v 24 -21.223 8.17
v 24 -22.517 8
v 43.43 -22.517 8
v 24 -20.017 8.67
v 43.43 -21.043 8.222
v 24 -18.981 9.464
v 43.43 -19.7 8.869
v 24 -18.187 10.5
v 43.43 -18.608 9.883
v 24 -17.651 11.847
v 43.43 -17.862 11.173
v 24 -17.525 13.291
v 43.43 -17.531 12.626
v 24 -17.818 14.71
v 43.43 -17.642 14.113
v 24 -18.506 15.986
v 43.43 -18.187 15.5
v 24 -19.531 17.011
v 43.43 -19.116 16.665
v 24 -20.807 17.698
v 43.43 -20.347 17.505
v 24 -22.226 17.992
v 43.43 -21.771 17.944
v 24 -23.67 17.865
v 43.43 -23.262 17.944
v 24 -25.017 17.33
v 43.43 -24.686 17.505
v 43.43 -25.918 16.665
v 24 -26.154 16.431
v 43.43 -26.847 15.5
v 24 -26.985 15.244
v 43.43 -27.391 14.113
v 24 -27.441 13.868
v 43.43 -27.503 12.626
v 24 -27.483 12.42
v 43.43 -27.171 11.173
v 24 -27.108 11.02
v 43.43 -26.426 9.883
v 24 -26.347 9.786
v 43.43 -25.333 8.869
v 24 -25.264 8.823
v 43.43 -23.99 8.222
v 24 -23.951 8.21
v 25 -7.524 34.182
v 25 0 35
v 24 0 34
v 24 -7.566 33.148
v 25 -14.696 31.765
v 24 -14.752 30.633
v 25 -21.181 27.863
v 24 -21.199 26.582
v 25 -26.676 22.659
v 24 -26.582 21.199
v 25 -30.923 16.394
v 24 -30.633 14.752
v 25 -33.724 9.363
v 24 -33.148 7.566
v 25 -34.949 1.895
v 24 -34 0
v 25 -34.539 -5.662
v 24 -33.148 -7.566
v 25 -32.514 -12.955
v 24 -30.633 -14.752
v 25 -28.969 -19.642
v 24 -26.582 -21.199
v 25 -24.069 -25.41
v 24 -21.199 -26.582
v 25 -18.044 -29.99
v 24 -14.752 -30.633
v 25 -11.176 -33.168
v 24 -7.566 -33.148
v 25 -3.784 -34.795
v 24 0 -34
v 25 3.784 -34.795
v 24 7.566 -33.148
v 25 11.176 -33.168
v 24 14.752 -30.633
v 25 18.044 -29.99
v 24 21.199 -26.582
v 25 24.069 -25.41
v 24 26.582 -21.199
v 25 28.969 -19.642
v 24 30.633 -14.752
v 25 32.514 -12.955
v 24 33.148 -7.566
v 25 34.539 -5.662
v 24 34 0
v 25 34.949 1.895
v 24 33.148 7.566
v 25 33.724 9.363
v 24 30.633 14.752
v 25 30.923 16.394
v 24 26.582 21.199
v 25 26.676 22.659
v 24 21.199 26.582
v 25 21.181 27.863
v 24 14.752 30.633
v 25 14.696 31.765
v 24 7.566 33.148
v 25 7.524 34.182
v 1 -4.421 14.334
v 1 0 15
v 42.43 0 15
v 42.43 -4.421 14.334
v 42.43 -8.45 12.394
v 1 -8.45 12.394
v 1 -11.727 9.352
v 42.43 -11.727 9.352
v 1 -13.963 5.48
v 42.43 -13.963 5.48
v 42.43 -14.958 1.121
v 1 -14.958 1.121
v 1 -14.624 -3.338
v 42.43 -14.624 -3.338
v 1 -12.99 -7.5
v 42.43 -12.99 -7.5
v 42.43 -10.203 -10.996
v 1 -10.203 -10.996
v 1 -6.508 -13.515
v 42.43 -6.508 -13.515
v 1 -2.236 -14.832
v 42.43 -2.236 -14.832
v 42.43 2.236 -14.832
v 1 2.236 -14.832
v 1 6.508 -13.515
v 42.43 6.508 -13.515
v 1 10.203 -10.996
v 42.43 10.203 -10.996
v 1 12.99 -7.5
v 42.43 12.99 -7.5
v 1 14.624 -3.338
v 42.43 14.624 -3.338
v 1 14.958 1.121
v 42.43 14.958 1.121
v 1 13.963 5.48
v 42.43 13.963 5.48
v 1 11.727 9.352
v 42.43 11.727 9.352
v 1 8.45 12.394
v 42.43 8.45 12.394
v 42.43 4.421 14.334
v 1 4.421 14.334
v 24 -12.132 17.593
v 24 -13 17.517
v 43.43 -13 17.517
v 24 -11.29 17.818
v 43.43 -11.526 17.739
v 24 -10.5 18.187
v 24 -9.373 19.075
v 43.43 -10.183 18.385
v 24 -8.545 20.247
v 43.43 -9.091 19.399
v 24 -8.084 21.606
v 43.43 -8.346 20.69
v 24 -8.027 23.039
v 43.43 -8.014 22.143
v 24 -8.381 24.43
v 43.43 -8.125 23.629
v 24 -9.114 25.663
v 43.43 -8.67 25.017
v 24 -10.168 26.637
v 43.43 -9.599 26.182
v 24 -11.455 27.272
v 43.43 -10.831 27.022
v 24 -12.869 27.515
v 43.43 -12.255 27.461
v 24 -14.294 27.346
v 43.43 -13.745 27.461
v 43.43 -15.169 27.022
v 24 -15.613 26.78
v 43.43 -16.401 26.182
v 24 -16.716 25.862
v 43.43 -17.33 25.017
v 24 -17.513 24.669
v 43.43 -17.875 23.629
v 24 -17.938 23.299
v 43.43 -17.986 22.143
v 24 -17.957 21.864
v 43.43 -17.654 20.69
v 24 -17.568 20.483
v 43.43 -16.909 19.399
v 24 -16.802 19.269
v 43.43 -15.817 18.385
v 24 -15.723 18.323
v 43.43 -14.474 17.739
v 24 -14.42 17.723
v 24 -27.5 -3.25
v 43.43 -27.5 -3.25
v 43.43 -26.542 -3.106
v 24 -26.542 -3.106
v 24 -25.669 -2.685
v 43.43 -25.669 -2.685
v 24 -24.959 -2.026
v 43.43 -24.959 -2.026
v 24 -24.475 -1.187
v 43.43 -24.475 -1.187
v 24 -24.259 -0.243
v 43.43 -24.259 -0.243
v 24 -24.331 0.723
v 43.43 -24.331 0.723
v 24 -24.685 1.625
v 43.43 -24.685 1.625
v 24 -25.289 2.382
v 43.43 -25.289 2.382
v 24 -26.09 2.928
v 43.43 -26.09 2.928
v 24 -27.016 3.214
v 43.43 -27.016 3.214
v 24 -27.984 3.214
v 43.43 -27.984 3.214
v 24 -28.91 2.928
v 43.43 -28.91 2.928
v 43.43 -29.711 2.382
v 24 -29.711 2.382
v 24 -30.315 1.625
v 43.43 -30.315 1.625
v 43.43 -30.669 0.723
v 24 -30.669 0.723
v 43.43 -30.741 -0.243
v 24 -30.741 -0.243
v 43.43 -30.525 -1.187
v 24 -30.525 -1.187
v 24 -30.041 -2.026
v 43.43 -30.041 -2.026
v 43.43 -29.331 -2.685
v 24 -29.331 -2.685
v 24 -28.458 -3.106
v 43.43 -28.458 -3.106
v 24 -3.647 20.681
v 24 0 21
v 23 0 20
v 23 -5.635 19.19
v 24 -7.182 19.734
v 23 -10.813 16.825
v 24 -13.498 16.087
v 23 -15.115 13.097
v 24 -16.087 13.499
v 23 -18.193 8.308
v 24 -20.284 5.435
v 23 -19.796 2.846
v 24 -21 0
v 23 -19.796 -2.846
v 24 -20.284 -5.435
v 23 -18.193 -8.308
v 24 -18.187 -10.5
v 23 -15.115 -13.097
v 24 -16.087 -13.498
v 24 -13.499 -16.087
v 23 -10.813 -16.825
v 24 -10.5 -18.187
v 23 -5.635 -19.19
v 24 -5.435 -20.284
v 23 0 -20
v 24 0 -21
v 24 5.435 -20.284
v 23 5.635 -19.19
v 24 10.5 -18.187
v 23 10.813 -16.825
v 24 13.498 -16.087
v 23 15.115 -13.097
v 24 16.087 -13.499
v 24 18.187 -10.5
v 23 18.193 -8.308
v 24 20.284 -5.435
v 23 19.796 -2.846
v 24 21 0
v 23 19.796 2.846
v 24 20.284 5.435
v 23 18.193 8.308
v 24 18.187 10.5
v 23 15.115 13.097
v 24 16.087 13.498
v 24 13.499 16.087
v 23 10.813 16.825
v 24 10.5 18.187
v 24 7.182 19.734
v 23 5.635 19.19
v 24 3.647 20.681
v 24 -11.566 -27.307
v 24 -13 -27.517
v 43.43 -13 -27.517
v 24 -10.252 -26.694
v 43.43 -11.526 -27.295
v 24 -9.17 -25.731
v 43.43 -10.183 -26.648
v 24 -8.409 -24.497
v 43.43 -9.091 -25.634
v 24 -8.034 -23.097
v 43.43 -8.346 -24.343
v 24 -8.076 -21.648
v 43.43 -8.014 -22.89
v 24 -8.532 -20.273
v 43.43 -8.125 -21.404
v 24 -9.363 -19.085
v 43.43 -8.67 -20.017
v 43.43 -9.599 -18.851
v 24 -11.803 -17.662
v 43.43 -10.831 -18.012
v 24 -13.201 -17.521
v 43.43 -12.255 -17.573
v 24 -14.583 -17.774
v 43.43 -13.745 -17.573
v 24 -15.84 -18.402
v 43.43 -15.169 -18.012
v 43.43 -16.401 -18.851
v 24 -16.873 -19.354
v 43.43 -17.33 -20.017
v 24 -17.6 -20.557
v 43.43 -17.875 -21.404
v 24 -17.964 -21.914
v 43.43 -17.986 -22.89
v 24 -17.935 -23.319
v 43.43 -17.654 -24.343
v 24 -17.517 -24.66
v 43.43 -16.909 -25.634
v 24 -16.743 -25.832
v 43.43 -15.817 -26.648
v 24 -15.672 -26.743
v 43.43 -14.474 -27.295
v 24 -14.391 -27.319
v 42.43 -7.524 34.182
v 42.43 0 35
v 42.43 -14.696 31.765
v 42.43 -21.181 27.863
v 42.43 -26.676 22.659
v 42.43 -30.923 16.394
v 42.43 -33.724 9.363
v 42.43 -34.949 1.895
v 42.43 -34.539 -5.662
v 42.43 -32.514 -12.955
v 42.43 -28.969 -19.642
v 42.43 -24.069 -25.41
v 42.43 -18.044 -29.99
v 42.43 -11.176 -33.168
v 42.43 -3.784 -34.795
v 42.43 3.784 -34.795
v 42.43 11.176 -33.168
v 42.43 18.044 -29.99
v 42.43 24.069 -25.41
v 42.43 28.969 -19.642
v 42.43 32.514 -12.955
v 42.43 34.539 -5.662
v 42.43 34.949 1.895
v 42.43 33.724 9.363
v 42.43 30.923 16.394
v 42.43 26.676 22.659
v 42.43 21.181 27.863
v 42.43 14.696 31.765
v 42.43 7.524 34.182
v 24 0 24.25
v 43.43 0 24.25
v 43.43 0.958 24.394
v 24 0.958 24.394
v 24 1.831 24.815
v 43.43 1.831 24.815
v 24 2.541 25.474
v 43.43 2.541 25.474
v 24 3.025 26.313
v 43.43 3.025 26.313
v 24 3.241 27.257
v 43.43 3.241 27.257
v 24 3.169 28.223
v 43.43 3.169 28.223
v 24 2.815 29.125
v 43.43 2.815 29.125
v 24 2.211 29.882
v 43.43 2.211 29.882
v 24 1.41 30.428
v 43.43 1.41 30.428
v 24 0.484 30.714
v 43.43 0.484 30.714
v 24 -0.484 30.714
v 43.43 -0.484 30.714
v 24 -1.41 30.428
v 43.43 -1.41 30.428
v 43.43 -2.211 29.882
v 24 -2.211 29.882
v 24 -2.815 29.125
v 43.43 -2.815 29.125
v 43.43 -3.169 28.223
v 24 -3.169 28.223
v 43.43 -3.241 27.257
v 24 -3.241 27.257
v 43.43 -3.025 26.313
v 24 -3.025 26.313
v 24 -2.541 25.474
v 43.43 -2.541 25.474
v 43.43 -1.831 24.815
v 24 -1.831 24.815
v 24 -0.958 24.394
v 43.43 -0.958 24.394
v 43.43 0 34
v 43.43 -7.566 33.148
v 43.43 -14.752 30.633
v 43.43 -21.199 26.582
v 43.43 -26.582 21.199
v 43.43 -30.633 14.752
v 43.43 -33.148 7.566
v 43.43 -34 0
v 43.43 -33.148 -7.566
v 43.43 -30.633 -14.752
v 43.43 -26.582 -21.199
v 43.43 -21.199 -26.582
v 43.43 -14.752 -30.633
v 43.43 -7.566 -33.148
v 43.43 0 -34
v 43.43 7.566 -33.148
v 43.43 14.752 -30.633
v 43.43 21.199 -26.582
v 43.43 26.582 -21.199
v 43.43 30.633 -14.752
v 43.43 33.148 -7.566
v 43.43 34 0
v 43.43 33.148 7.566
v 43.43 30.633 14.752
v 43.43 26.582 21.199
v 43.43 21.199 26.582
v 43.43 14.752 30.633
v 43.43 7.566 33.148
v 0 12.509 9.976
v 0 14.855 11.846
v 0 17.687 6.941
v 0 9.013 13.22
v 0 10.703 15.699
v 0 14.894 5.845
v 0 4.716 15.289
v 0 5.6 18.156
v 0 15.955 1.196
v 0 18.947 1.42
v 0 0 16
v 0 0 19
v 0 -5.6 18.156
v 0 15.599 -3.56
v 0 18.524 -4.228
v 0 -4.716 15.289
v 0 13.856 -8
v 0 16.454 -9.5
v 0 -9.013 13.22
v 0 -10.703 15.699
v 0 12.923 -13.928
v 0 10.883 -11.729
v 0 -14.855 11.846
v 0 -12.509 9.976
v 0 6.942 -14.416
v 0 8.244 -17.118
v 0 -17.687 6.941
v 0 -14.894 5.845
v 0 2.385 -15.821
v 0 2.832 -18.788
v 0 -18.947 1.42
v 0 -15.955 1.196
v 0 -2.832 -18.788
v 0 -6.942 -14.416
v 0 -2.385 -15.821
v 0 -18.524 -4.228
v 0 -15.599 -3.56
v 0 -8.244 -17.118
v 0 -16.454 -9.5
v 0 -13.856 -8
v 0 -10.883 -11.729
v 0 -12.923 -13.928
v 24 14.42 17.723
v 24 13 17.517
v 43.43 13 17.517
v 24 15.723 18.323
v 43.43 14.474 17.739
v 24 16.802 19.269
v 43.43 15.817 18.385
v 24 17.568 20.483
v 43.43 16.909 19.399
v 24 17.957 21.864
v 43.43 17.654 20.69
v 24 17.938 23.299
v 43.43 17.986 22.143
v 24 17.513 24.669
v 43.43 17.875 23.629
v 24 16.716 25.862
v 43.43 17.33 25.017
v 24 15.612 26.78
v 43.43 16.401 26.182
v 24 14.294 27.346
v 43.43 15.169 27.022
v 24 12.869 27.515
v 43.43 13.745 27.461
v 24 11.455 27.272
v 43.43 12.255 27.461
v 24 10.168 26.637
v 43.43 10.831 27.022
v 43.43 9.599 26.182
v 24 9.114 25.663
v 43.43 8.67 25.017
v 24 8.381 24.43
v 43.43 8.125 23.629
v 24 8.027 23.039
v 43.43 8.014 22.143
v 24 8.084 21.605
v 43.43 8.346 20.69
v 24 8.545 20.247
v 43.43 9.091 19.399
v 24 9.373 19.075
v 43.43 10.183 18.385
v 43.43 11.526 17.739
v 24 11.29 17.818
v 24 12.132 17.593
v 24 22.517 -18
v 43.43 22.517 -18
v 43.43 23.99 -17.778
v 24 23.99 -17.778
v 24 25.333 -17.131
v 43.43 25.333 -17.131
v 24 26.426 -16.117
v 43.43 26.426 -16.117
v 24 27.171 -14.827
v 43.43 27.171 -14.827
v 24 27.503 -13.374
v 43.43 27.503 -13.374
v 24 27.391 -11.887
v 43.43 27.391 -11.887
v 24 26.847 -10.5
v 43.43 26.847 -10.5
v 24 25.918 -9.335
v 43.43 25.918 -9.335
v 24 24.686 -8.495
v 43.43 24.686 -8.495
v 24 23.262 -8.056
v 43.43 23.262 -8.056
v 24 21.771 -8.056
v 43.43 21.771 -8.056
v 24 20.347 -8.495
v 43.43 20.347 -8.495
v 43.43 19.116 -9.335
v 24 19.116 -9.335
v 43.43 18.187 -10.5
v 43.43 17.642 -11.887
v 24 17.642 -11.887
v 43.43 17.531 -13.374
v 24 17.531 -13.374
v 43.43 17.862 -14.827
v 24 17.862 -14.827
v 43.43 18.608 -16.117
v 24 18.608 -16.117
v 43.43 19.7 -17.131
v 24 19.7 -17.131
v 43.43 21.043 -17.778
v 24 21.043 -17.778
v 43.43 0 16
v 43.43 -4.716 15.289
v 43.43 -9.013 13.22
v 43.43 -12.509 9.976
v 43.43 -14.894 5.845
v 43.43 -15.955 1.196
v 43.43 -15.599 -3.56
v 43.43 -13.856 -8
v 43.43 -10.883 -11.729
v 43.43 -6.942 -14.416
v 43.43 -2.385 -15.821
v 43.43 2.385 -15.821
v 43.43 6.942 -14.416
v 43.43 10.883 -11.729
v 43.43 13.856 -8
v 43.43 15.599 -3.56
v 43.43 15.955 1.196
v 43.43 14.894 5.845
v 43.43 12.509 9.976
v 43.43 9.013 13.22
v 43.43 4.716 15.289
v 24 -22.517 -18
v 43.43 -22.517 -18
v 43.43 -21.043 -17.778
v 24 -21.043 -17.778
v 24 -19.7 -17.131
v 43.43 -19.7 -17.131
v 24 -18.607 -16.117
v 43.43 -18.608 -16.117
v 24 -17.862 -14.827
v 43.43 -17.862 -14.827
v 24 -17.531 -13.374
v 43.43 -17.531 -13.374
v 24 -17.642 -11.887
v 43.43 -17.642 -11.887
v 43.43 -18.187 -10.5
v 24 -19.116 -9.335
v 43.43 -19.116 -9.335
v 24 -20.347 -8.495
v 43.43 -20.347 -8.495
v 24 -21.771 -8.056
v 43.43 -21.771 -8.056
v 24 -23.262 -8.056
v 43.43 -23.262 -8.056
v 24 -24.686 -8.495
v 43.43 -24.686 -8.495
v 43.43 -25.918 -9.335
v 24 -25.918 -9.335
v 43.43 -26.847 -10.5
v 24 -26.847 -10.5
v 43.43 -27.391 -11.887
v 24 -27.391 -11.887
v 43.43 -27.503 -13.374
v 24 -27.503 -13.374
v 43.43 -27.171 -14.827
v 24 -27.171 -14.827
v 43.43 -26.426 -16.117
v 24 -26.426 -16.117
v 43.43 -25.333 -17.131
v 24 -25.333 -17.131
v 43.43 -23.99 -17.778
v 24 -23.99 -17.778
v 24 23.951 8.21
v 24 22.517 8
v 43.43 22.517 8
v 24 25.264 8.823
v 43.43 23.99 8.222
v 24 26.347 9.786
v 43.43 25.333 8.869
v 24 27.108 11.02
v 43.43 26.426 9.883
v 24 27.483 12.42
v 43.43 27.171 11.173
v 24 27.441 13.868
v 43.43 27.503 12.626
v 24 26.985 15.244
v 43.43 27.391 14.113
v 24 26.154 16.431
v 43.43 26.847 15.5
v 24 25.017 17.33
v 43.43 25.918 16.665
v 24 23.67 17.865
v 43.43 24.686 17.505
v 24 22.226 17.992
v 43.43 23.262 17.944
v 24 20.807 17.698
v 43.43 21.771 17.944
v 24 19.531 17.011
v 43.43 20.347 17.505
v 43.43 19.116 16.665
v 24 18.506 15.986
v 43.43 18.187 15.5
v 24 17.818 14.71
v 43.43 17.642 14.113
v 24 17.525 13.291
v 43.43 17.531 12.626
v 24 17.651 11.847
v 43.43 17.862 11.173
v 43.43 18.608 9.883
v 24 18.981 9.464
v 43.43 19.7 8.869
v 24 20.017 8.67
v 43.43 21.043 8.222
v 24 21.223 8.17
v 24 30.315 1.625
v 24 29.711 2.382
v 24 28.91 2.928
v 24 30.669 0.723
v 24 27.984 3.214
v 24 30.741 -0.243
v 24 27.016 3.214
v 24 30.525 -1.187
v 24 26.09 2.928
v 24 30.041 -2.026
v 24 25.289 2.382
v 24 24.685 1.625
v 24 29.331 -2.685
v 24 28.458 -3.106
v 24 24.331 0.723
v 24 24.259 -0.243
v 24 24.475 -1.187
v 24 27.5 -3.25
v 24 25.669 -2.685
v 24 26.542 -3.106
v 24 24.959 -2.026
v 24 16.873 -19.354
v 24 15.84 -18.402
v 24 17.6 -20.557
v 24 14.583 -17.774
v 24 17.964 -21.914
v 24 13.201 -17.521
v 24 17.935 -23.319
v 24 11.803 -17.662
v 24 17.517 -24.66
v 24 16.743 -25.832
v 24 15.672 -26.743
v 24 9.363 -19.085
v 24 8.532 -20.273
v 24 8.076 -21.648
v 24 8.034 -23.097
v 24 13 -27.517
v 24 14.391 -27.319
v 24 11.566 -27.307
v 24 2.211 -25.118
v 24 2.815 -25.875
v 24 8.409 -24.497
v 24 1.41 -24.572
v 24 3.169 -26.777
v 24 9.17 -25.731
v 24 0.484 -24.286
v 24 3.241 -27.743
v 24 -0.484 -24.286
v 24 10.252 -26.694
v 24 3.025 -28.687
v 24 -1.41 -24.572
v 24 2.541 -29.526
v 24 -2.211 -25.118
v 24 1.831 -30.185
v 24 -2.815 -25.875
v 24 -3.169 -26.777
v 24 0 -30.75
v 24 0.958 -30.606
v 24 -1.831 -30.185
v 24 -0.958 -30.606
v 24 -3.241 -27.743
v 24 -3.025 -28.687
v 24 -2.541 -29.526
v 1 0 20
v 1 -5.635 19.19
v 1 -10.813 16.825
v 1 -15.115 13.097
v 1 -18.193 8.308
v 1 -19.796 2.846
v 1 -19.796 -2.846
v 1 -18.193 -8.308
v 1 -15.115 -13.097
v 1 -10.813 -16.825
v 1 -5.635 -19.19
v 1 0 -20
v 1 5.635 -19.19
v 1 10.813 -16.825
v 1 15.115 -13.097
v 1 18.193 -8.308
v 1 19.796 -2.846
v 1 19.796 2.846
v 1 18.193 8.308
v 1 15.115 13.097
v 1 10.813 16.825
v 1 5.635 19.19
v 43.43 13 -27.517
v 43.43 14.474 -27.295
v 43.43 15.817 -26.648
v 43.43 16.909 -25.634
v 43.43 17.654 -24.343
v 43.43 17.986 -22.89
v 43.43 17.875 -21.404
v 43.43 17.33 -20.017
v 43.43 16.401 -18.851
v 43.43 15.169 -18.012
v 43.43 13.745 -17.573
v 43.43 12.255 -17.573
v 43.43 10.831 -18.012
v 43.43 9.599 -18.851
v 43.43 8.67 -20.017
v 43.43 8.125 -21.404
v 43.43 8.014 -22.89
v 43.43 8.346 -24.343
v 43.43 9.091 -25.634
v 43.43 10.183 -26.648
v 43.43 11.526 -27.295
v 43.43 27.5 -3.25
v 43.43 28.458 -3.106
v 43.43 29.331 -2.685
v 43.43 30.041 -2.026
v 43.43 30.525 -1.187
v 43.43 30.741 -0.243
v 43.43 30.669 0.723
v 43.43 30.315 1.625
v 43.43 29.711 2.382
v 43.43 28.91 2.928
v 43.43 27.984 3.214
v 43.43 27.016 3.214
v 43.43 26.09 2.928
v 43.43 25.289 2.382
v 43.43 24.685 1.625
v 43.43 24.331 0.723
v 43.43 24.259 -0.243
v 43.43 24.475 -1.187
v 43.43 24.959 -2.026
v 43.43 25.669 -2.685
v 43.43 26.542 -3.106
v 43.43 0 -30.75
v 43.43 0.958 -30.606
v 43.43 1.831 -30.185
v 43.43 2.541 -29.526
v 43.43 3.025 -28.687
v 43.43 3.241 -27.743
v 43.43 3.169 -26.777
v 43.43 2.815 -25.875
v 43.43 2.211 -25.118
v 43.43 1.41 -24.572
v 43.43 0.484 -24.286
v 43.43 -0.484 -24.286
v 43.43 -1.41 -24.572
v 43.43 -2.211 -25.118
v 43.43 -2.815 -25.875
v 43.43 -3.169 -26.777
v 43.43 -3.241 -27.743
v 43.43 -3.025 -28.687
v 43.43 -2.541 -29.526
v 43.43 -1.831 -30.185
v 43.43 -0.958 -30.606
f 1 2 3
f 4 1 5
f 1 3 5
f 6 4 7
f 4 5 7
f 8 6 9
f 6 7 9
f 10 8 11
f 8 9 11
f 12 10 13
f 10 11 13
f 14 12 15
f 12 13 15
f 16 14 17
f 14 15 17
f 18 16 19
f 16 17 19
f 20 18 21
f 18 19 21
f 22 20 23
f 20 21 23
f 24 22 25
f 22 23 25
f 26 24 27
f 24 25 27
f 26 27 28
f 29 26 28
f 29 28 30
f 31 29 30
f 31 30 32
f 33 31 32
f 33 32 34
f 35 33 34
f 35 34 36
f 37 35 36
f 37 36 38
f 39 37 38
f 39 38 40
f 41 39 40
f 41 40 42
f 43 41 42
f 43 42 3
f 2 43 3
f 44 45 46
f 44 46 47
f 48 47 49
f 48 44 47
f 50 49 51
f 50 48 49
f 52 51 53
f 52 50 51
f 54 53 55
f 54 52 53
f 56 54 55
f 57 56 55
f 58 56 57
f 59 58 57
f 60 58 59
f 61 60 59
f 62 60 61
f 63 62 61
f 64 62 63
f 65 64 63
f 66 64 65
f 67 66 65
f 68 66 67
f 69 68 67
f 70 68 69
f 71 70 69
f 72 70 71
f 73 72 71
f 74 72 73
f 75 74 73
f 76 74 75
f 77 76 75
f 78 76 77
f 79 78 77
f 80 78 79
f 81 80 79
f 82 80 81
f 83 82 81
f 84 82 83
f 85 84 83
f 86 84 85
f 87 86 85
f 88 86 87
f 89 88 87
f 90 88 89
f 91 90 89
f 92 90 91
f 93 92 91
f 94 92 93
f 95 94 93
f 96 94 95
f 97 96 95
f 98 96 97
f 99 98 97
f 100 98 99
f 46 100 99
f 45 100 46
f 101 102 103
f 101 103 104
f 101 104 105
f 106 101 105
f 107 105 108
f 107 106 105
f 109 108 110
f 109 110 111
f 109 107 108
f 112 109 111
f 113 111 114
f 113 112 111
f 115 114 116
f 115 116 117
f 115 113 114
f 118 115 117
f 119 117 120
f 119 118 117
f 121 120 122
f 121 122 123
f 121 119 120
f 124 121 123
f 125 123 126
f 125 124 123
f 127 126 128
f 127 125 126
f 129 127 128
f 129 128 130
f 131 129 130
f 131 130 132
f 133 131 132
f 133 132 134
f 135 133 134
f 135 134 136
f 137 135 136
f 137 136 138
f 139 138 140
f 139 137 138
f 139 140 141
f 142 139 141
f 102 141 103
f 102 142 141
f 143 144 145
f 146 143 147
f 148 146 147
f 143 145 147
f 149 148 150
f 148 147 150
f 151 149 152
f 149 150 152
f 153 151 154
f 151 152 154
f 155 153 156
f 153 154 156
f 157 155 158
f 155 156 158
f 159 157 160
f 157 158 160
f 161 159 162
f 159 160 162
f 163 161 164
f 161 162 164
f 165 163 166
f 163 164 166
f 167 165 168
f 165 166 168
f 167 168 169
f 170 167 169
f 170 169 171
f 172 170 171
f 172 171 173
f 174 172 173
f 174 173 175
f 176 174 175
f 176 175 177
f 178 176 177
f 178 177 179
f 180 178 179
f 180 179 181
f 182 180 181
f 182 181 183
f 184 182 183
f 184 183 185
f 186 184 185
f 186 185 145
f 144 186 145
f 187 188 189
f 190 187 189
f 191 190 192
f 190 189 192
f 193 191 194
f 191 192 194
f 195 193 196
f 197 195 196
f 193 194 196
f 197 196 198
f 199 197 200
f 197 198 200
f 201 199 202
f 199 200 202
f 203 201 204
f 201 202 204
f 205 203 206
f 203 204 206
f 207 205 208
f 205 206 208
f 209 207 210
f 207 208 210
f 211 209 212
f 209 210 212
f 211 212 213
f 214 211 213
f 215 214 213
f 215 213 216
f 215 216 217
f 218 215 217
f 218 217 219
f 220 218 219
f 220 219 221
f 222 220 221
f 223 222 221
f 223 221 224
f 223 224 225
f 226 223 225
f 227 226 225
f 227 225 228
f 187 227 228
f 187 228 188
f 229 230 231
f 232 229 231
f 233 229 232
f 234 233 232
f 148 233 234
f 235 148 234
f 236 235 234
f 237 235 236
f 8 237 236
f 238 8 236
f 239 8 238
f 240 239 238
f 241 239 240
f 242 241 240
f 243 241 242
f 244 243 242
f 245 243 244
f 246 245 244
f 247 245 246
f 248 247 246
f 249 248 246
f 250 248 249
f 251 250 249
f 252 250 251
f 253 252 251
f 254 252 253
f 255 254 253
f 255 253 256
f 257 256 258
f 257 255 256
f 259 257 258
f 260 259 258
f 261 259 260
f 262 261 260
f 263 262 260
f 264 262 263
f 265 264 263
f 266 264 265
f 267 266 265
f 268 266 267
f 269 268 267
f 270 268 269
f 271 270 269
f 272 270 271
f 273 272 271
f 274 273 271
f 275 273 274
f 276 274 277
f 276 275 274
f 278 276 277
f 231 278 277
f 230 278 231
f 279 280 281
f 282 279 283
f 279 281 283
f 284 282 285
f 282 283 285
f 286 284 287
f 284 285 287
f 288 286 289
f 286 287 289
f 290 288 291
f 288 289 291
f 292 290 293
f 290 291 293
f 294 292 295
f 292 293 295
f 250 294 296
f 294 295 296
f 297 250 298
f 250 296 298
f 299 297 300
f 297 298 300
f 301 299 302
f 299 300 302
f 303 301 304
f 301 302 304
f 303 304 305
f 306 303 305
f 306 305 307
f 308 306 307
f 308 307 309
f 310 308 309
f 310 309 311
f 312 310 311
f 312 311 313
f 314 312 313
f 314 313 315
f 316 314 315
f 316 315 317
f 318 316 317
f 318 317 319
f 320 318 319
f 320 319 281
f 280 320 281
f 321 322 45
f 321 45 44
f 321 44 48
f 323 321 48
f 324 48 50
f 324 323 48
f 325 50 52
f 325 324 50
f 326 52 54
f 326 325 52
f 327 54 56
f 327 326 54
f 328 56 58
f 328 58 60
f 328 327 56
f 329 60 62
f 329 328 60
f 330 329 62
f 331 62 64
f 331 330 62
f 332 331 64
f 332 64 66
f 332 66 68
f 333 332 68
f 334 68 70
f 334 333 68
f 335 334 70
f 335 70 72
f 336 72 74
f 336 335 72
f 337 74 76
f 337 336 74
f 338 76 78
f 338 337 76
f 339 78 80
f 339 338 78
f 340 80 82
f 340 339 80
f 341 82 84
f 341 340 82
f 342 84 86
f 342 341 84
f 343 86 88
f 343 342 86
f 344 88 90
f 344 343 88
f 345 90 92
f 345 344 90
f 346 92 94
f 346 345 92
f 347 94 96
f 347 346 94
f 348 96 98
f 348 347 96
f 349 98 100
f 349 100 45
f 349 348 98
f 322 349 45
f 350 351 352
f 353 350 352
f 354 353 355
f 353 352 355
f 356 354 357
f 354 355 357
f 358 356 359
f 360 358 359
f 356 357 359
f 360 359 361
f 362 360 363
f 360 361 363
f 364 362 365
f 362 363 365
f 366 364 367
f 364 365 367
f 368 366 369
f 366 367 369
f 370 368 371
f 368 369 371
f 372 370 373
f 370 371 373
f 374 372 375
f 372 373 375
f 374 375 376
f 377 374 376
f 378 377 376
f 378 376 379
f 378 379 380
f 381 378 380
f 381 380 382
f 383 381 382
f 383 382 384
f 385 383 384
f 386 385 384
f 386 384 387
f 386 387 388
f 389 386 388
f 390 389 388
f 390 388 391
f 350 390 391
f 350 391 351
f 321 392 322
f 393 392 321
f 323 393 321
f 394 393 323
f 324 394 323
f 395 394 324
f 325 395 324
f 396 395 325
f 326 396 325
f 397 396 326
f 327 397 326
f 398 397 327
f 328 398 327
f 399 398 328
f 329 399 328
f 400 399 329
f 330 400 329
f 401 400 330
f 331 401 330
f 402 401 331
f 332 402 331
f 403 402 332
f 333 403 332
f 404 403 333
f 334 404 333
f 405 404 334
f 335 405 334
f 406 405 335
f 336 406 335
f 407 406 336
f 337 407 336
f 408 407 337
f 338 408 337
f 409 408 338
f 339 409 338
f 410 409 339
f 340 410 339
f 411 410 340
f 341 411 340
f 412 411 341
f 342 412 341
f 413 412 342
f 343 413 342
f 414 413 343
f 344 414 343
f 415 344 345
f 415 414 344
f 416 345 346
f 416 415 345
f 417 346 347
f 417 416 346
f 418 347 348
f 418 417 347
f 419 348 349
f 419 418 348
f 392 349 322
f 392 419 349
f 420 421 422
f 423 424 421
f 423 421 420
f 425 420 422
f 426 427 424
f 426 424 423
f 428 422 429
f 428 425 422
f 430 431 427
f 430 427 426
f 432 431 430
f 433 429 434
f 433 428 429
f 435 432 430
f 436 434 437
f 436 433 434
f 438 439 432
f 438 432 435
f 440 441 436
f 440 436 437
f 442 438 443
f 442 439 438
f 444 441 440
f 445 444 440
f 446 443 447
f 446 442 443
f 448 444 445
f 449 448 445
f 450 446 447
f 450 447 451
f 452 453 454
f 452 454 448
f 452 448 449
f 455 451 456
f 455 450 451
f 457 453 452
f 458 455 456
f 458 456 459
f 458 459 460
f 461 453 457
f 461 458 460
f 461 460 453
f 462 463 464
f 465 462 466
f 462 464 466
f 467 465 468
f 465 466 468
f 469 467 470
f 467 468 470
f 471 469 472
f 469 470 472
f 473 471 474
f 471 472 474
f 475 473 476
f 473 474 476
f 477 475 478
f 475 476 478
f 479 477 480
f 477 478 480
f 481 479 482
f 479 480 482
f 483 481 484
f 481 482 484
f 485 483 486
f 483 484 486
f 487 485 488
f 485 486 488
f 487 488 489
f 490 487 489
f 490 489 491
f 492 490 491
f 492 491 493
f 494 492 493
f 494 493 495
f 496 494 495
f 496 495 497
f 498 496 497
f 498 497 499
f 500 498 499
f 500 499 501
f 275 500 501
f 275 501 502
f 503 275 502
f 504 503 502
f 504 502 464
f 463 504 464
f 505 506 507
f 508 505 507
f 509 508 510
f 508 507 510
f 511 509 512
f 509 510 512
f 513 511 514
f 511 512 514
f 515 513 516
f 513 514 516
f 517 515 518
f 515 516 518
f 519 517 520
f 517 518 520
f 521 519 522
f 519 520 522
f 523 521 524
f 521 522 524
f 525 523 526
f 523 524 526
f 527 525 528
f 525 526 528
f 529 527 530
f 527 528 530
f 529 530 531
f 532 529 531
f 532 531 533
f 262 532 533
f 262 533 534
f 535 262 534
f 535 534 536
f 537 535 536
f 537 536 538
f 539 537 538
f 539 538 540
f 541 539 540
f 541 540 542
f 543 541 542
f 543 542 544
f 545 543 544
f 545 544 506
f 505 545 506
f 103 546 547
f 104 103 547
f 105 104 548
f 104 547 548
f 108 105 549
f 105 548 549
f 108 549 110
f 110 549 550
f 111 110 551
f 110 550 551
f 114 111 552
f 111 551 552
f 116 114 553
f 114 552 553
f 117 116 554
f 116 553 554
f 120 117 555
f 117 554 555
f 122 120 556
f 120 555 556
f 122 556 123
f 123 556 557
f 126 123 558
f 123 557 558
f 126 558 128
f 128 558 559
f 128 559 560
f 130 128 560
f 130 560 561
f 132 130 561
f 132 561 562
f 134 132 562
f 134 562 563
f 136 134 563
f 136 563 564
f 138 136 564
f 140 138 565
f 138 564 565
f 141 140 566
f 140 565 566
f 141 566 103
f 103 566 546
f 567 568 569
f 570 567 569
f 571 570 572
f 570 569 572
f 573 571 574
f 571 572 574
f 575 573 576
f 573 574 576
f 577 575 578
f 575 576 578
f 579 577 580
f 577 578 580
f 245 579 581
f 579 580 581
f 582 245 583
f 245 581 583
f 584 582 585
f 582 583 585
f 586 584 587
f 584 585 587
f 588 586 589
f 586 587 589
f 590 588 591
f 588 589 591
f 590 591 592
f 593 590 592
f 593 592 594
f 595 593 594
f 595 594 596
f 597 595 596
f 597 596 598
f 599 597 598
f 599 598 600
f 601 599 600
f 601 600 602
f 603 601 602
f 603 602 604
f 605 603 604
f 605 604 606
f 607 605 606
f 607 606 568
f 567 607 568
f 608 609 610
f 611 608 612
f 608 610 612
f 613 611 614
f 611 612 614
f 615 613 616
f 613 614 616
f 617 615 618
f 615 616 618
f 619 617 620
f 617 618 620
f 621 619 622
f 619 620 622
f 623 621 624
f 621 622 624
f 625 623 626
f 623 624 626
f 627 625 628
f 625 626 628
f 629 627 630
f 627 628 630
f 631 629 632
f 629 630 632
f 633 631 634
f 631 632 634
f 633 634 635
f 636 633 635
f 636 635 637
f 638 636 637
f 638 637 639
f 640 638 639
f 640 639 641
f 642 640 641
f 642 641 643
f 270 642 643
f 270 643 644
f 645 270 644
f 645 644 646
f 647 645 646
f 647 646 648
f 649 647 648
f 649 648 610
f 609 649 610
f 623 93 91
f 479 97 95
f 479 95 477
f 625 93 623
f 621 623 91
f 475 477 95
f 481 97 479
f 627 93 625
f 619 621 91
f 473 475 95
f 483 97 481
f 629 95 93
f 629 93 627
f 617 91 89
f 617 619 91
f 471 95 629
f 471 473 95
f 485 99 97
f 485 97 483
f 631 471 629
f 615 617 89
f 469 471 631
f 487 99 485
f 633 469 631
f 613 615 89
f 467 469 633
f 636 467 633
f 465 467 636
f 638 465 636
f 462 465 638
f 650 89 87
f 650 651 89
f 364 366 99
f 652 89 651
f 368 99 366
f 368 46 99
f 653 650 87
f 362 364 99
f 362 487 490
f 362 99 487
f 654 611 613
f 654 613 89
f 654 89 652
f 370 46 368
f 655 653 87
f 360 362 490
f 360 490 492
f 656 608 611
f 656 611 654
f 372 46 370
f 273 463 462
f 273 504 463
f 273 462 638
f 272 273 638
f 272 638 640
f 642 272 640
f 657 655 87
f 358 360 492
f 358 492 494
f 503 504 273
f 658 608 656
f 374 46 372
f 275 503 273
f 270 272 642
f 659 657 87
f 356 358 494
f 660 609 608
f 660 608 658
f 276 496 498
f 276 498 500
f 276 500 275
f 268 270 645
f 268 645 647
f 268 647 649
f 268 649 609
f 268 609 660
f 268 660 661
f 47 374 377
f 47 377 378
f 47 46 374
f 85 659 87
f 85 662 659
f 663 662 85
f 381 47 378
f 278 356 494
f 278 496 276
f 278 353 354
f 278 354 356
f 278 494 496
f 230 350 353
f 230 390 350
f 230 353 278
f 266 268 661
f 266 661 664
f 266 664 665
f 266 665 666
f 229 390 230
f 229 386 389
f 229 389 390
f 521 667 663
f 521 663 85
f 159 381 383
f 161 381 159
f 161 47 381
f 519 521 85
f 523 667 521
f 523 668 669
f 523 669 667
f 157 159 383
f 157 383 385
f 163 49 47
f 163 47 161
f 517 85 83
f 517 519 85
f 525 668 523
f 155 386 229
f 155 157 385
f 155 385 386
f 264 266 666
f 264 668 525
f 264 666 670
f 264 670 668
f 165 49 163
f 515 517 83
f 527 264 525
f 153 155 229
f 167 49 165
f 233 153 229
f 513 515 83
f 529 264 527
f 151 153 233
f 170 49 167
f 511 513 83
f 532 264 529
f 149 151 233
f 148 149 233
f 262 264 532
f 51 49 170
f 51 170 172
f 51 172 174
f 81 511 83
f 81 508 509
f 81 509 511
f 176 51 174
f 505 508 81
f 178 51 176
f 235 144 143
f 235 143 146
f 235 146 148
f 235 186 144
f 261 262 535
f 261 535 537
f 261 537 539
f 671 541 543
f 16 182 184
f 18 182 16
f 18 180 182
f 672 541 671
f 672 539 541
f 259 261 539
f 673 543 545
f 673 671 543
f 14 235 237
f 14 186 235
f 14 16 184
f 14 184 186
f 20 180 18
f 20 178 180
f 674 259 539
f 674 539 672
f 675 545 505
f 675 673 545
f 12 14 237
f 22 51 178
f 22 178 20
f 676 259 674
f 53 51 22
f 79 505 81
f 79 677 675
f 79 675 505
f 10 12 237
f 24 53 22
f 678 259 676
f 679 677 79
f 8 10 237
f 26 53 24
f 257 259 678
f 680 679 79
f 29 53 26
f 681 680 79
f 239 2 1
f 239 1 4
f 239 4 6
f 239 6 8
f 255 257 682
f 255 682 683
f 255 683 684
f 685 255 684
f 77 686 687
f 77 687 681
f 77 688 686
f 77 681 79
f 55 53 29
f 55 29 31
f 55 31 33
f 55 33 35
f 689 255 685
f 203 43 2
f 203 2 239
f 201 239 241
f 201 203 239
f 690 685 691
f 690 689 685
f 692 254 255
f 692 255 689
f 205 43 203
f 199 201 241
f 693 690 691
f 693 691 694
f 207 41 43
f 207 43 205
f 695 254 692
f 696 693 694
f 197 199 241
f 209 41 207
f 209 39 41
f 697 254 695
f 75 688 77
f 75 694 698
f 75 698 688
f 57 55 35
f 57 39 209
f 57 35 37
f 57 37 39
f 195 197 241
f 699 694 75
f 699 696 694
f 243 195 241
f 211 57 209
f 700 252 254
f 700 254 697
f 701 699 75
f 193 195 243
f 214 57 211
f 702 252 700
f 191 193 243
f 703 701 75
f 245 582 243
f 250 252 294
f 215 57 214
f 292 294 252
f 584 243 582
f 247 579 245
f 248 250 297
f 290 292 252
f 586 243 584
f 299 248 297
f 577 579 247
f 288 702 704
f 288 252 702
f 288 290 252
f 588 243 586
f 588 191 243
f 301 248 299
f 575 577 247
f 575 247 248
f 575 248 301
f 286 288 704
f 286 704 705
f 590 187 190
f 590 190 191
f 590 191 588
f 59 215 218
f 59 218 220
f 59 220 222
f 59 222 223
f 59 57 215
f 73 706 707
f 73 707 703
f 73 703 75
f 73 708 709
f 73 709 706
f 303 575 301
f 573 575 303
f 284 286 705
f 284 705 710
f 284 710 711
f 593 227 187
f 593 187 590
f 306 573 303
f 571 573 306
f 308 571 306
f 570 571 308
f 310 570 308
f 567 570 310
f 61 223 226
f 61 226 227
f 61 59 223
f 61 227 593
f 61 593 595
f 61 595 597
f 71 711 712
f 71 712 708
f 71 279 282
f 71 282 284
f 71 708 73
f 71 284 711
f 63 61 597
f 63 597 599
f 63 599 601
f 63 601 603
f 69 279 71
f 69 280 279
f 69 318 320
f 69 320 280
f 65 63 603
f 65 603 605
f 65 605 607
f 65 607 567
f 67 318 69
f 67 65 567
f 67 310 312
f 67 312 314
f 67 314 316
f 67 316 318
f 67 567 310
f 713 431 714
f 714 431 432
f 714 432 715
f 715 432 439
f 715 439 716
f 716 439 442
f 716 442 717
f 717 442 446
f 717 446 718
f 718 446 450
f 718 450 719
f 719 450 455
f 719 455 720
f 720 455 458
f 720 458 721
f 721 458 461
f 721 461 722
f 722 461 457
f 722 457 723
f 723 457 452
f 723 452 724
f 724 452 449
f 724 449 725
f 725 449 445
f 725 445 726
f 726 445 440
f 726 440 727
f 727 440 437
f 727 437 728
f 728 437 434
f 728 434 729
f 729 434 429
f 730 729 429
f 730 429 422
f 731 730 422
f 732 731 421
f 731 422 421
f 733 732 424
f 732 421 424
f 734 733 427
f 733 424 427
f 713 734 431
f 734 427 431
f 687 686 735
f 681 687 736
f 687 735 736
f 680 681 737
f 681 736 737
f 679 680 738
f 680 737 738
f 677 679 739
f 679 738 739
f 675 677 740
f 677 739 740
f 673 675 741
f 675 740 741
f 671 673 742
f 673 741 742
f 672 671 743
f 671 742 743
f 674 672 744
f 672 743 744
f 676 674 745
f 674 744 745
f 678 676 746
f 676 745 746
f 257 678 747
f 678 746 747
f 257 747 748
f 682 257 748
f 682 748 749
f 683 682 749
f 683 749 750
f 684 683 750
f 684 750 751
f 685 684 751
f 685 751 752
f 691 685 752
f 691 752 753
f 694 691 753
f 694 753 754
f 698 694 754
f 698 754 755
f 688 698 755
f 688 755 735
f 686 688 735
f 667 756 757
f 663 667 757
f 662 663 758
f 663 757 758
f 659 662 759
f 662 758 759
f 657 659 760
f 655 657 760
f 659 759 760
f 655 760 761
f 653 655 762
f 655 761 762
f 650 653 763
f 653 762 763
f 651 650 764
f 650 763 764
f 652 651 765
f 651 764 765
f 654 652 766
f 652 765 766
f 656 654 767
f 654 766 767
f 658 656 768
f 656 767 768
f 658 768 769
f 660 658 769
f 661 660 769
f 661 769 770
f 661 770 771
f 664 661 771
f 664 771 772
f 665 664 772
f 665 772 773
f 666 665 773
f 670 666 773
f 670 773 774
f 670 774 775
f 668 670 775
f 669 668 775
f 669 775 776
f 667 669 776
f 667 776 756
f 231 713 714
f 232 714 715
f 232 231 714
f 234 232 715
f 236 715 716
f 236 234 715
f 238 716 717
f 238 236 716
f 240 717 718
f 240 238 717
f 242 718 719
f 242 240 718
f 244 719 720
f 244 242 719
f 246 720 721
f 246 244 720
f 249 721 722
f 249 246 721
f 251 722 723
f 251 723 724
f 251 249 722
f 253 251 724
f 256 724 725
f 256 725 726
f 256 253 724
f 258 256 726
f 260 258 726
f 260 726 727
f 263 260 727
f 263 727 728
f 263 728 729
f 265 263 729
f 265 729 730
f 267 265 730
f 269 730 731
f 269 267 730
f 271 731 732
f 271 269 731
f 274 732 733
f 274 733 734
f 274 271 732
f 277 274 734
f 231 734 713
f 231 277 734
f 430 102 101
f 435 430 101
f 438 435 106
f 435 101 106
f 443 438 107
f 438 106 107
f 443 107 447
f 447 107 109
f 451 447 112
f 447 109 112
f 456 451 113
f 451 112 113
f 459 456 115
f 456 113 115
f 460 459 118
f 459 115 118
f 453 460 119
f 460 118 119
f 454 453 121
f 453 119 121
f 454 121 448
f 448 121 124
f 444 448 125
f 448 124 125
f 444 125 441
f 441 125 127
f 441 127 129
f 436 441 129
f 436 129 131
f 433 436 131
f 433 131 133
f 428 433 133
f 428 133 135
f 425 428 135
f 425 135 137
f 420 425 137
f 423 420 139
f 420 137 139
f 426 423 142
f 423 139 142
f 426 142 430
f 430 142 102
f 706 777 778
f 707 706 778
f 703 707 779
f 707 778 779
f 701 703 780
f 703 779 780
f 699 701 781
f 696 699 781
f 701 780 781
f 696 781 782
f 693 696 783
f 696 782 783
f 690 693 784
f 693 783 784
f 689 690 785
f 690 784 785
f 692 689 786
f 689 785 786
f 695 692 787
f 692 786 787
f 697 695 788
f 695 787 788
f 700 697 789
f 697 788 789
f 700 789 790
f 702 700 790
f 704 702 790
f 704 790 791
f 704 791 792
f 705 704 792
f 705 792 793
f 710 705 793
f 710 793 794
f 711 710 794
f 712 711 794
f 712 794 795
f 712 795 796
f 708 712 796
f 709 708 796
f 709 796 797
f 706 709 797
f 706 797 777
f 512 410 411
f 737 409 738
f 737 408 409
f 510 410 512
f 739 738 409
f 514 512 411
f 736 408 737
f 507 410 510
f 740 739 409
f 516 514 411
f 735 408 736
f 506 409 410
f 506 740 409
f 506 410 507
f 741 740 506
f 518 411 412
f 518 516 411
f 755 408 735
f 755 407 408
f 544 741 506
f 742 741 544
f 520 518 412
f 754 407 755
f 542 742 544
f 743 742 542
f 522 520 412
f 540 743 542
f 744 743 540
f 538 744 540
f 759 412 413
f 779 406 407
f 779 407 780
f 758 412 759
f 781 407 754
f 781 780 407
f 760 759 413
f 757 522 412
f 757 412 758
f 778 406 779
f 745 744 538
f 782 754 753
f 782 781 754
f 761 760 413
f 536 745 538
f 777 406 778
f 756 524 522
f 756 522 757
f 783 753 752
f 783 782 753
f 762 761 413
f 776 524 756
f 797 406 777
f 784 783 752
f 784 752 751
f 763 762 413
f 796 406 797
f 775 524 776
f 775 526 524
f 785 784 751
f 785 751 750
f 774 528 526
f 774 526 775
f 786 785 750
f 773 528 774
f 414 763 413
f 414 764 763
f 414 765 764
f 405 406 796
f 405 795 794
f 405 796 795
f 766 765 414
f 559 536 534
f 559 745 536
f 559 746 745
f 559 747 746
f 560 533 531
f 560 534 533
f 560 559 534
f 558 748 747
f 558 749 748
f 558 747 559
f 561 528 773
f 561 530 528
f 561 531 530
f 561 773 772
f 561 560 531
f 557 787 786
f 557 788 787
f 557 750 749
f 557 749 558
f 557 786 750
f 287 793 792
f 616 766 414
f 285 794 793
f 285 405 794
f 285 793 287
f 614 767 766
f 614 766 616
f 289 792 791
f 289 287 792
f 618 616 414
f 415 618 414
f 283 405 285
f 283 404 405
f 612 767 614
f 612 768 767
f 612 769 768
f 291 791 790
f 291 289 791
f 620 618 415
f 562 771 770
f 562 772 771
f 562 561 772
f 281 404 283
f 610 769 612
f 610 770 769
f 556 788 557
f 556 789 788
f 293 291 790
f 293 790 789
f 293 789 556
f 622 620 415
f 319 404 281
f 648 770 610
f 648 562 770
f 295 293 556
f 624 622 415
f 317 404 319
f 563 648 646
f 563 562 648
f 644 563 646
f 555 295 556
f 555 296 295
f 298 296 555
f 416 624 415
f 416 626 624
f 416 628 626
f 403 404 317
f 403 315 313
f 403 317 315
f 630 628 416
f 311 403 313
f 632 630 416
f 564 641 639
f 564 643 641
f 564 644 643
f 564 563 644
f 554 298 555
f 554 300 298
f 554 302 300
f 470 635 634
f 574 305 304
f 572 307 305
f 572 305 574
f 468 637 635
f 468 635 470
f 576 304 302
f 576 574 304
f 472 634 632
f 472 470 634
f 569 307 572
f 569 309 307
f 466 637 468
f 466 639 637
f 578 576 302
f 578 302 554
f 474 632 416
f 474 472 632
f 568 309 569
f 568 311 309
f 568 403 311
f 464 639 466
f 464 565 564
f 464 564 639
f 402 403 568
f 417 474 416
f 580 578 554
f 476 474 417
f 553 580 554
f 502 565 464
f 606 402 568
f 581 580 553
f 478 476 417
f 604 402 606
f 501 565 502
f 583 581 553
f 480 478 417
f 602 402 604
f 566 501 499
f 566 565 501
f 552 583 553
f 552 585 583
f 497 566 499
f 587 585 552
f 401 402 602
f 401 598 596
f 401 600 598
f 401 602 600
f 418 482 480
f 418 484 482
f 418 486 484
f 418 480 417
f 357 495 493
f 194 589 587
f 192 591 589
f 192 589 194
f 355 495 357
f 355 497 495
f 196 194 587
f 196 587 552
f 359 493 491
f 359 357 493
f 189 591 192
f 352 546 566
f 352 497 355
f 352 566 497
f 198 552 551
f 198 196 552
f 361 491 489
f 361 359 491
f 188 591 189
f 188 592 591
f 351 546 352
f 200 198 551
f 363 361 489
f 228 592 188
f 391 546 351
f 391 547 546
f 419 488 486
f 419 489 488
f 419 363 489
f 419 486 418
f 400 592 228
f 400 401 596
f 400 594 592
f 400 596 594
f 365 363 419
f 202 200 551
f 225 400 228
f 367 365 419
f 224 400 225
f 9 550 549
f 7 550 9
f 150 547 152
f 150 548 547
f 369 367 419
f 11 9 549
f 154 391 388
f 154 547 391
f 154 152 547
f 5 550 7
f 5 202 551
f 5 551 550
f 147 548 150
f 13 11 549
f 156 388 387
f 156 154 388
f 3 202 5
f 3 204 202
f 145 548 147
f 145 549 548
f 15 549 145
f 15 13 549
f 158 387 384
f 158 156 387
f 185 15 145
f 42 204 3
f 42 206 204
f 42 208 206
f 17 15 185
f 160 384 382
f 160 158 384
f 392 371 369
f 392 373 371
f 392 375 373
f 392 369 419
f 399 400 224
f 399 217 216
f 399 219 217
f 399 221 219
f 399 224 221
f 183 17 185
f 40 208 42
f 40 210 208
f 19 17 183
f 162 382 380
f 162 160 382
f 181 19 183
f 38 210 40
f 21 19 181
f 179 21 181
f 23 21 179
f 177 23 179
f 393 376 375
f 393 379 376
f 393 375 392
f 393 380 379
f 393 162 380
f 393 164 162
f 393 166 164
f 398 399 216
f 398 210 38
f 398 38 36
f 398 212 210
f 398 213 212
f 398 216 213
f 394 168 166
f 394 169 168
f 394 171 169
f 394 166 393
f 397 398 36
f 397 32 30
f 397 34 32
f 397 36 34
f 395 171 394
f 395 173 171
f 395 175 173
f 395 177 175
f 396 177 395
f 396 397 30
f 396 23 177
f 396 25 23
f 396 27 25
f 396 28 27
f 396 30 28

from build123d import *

# Parameters (mm, degrees)
SKETCH2_R              = 3.25
CUT_EXTRUDE1_DEPTH     = 66.849562641
CHAMFER1_SIZE          = 1
SKETCH3_R              = 5
LIGHTENING_HOLES_DEPTH = 66.849562641


with BuildPart() as part:
    # Sketch1 → Revolve1 (revolve)
    with BuildSketch(Plane(origin=(0, 0, 0), x_dir=(1, 0, 0), z_dir=(0, 1, 0)), mode=Mode.PRIVATE) as revolve1_sk:
        Polygon((0, 20), (24, 20), (24, 35), (43.43, 35), (43.43, 15), (0, 15), align=None)
    revolve(revolve1_sk.sketch.rotate(Axis((0, 0, 0), (1, 0, 0)), 180), axis=Axis((0, 0, 0), (1, 0, 0)))

    # Sketch2 → Cut-Extrude1 (cut, through all)
    with BuildSketch(Plane(origin=(43.43, 0, 0), x_dir=(0, 0, -1), z_dir=(1, 0, 0))):
        with Locations((0, 27.5)):
            Circle(SKETCH2_R)
        with Locations((27.5, 0)):
            Circle(SKETCH2_R)
        with Locations((-27.5, 0)):
            Circle(SKETCH2_R)
        with Locations((0, -27.5)):
            Circle(SKETCH2_R)
    extrude(amount=-CUT_EXTRUDE1_DEPTH, mode=Mode.SUBTRACT)

    # Chamfer1
    chamfer1_edges = [part.edges().sort_by_distance(p)[0] for p in [
        (0, 0, -15),
        (43.43, 0, -15),
        (43.43, 0, -35),
        (24, 0, -35),
        (24, 0, -20),
        (0, 0, -20),
    ]]
    chamfer(chamfer1_edges, length=CHAMFER1_SIZE)

    # Sketch3 → lightening holes (cut, through all)
    with BuildSketch(Plane(origin=(43.43, 0, 0), x_dir=(0, 0, -1), z_dir=(1, 0, 0))):
        with Locations((13, 22.516660498)):
            Circle(SKETCH3_R)
        with Locations((22.516660498, 13)):
            Circle(SKETCH3_R)
        with Locations((22.516660498, -13)):
            Circle(SKETCH3_R)
        with Locations((13, -22.516660498)):
            Circle(SKETCH3_R)
        with Locations((-13, -22.516660498)):
            Circle(SKETCH3_R)
        with Locations((-22.516660498, -13)):
            Circle(SKETCH3_R)
        with Locations((-22.516660498, 13)):
            Circle(SKETCH3_R)
        with Locations((-13, 22.516660498)):
            Circle(SKETCH3_R)
    extrude(amount=-LIGHTENING_HOLES_DEPTH, mode=Mode.SUBTRACT)


solid = part.part
